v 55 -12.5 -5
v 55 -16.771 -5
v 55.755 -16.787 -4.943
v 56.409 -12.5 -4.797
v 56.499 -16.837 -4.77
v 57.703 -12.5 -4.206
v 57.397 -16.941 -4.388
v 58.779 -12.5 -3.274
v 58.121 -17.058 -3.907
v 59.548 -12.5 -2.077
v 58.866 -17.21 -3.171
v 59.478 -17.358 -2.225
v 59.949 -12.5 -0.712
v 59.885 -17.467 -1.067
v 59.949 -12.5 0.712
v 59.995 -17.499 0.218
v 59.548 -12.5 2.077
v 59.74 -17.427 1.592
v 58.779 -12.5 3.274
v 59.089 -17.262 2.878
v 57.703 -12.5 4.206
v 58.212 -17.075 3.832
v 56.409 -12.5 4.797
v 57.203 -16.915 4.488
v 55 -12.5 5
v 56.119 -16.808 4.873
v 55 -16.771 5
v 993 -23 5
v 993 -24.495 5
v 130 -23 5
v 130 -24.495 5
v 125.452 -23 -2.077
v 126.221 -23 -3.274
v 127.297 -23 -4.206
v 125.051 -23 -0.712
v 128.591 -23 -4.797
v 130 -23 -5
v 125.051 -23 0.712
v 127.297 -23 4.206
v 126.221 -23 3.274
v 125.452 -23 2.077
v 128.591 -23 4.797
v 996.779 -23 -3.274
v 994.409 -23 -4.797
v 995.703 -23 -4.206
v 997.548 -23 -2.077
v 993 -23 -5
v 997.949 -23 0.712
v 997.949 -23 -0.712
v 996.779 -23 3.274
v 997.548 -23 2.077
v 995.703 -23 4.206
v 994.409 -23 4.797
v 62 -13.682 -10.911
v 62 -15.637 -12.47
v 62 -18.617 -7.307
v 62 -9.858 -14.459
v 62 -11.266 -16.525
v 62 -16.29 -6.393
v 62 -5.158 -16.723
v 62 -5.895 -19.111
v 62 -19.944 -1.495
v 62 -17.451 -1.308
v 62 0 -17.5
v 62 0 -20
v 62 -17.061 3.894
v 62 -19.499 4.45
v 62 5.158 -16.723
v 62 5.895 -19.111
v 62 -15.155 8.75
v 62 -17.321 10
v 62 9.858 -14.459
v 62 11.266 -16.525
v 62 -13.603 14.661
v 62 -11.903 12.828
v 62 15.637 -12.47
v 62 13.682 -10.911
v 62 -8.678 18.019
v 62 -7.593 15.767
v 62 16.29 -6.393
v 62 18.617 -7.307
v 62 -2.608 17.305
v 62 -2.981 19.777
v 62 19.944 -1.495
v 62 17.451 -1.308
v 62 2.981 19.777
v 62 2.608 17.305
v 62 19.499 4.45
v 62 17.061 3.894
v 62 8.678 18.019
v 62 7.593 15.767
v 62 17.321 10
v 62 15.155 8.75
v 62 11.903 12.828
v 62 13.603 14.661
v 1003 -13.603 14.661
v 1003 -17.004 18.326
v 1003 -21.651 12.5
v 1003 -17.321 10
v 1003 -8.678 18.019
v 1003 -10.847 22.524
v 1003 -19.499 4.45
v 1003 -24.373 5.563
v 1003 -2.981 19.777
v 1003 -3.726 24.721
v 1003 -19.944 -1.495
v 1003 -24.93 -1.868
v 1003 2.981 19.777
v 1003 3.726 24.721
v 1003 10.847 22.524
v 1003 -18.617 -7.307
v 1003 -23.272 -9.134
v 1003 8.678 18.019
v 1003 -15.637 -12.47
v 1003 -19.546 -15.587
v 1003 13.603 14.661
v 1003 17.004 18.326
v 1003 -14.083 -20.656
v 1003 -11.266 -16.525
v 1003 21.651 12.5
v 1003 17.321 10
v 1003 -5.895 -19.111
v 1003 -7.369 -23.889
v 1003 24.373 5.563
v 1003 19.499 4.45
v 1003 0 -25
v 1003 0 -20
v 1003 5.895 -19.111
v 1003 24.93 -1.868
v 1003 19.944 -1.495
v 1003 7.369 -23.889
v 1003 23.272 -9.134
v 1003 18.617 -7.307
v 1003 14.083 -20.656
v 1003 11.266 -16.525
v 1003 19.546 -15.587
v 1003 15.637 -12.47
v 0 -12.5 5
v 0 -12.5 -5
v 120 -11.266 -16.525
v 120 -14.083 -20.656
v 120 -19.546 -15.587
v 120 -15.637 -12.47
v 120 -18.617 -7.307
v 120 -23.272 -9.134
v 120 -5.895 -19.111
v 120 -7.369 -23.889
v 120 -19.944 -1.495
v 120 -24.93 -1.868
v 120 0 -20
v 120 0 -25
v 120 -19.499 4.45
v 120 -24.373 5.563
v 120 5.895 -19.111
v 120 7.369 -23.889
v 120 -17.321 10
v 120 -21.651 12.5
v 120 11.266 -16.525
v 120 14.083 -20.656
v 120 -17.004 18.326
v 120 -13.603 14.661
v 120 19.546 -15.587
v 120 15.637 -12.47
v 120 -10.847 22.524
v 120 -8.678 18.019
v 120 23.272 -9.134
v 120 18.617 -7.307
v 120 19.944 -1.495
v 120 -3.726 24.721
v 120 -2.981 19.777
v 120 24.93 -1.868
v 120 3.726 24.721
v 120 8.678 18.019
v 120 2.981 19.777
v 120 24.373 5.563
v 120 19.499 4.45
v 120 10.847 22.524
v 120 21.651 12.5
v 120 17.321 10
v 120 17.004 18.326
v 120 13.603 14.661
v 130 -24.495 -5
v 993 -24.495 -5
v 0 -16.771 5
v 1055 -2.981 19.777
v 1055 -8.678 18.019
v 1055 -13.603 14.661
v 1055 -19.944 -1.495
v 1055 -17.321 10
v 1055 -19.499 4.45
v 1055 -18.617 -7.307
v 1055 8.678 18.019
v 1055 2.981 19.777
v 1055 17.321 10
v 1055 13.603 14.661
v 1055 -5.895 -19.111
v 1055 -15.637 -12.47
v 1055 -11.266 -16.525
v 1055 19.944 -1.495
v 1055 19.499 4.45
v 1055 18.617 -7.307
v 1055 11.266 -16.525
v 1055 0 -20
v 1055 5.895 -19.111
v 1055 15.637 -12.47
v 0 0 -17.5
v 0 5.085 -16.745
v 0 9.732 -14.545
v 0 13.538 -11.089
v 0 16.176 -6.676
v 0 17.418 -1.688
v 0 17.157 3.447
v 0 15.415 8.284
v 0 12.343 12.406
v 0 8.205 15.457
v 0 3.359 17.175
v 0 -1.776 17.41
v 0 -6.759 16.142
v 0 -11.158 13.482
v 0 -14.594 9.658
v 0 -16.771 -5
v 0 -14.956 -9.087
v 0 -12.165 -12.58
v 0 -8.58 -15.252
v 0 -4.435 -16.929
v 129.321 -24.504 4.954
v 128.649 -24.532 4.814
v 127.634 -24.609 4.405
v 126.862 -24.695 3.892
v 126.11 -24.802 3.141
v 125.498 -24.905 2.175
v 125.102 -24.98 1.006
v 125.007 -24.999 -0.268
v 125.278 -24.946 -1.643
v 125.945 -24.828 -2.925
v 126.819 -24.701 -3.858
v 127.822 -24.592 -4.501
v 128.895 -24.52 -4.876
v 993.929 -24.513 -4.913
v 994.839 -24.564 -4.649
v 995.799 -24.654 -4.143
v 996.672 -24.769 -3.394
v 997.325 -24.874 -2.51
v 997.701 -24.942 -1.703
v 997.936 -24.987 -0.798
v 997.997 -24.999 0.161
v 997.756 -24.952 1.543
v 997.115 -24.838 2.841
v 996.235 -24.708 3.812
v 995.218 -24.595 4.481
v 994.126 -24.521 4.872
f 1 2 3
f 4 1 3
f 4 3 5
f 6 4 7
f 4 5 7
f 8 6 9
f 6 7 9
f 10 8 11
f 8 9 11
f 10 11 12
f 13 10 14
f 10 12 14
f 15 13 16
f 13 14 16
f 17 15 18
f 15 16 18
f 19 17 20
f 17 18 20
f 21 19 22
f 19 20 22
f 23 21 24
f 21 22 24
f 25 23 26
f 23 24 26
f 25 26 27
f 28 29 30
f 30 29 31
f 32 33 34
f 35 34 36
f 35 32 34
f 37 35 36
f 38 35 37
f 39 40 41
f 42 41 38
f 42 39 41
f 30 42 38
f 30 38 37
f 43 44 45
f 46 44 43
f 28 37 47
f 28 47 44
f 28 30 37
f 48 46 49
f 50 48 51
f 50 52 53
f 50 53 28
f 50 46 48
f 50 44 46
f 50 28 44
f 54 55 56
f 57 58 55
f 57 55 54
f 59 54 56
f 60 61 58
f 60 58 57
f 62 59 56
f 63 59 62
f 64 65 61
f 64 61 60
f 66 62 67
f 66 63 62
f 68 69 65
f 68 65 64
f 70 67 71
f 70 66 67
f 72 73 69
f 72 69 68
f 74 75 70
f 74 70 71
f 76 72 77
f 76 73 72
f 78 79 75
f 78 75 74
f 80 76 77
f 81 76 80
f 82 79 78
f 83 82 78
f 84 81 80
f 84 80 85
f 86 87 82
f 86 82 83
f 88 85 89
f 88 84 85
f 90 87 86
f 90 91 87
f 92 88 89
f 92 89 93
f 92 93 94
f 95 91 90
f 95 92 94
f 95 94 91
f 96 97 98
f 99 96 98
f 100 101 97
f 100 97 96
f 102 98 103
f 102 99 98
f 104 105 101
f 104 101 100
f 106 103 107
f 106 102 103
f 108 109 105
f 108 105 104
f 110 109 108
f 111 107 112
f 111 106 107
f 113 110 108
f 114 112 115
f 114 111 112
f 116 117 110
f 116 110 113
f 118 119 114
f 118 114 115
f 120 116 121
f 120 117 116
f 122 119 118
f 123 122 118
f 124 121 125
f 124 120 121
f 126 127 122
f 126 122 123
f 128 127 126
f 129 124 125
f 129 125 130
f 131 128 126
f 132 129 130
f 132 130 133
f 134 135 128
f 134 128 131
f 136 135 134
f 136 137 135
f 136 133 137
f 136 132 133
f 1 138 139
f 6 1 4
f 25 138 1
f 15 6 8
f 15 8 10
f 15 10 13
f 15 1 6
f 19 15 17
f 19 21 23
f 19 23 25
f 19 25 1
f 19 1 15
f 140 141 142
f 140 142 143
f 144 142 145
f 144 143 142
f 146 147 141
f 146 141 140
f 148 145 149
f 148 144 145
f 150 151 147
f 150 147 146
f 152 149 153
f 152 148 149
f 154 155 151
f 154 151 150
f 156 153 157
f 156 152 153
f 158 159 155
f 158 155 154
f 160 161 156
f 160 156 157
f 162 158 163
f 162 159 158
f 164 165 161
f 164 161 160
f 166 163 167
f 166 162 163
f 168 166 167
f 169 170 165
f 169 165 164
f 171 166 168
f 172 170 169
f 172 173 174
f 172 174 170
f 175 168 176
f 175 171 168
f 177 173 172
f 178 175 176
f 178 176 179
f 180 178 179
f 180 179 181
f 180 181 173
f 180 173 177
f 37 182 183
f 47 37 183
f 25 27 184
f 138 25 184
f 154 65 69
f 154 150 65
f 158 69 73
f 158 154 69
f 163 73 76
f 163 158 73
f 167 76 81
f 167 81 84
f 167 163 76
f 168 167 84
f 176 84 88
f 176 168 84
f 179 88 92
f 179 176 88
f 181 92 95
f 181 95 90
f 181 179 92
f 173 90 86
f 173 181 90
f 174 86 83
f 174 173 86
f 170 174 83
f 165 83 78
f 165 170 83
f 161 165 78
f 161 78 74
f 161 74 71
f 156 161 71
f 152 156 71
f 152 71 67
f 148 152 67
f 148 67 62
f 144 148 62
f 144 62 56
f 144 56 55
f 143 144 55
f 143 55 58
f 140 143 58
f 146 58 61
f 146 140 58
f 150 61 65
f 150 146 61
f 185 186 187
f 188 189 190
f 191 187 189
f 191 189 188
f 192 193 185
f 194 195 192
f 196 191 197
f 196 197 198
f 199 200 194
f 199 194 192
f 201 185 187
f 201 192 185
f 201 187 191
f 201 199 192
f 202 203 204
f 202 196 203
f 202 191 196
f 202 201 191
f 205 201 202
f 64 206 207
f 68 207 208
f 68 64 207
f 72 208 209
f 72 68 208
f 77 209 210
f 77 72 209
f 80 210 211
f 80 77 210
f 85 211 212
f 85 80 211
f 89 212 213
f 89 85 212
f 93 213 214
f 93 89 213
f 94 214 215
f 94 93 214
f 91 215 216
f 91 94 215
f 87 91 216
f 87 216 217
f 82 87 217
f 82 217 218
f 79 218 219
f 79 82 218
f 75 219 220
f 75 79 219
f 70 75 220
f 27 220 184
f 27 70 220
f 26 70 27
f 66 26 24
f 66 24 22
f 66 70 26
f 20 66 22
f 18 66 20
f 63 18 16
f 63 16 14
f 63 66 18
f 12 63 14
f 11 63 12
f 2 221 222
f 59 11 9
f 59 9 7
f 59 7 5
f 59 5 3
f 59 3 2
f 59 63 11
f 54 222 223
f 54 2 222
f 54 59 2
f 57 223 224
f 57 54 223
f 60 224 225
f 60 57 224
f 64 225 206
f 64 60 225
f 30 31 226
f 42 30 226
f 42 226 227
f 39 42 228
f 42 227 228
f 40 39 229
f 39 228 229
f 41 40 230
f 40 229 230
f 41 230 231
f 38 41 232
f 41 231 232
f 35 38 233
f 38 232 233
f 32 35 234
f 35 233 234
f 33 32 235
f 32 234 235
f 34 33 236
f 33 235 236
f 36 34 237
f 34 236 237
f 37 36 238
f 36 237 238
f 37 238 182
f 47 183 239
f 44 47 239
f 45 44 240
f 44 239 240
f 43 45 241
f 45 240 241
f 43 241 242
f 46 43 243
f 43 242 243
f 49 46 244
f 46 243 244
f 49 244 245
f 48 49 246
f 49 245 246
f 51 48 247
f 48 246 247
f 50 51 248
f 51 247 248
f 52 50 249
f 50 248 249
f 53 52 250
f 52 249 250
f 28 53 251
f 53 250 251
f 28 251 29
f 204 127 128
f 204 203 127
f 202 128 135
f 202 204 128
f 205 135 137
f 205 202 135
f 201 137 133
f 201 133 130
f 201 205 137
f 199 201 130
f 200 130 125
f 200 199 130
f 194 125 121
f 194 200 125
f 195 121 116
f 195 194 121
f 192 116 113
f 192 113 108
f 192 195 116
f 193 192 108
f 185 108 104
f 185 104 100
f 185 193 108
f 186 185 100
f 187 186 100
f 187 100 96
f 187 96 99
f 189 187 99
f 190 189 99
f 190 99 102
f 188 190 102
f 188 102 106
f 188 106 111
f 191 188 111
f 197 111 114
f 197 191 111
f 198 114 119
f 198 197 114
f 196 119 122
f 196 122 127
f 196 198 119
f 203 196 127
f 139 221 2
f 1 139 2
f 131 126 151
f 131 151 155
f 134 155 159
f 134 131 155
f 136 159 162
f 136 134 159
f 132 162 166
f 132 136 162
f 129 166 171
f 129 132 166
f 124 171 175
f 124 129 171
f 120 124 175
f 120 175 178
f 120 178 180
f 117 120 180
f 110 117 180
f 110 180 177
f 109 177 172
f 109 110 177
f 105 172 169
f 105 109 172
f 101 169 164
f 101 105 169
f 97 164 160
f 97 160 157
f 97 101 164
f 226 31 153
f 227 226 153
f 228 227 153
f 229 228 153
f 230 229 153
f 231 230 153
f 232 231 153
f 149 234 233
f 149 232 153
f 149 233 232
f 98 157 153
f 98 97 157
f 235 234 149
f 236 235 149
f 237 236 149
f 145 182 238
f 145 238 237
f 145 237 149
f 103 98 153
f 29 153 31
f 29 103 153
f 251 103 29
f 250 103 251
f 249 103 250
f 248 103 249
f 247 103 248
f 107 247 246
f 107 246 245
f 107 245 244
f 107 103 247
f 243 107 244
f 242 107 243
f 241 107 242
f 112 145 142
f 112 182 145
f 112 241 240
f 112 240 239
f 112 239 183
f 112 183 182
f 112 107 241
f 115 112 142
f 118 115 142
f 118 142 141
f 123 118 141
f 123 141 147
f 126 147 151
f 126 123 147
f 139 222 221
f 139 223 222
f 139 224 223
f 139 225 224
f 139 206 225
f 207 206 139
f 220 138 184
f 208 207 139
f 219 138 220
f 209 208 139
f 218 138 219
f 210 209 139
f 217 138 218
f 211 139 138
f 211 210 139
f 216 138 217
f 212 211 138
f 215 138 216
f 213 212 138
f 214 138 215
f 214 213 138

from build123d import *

# Parameters (mm, degrees)
F5_DEPTH = 5
F7_DEPTH = 2


with BuildPart() as f3:
    # F2 (on Front) → F3 (revolve)
    with BuildSketch(Plane.XZ):
        Polygon((1055, 0), (0, 0), (0, -17.5), (62, -17.5), (62, -20), (120, -20), (120, -25), (1003, -25), (1003, -20), (1055, -20), align=None)
    revolve(axis=Axis((527.5, 0, 0), (1, 0, 0)))

    # F4 (on offset) → F5 (cut)
    with BuildSketch(Plane.XZ.offset(17.5)):
        with BuildLine():
            Line((55, 5), (0, 5))
            Line((0, 5), (0, -5))
            Line((0, -5), (55, -5))
            ThreePointArc((55, -5), (60, 0), (55, 5))
        make_face()
    extrude(amount=-F5_DEPTH, mode=Mode.SUBTRACT)

    # F6 (on offset) → F7 (cut)
    with BuildSketch(Plane.XZ.offset(25)):
        with BuildLine():
            Line((993, 5), (130, 5))
            ThreePointArc((130, 5), (125, 0), (130, -5))
            Line((130, -5), (993, -5))
            ThreePointArc((993, -5), (998, 0), (993, 5))
        make_face()
    extrude(amount=-F7_DEPTH, mode=Mode.SUBTRACT)


solid = f3.part
